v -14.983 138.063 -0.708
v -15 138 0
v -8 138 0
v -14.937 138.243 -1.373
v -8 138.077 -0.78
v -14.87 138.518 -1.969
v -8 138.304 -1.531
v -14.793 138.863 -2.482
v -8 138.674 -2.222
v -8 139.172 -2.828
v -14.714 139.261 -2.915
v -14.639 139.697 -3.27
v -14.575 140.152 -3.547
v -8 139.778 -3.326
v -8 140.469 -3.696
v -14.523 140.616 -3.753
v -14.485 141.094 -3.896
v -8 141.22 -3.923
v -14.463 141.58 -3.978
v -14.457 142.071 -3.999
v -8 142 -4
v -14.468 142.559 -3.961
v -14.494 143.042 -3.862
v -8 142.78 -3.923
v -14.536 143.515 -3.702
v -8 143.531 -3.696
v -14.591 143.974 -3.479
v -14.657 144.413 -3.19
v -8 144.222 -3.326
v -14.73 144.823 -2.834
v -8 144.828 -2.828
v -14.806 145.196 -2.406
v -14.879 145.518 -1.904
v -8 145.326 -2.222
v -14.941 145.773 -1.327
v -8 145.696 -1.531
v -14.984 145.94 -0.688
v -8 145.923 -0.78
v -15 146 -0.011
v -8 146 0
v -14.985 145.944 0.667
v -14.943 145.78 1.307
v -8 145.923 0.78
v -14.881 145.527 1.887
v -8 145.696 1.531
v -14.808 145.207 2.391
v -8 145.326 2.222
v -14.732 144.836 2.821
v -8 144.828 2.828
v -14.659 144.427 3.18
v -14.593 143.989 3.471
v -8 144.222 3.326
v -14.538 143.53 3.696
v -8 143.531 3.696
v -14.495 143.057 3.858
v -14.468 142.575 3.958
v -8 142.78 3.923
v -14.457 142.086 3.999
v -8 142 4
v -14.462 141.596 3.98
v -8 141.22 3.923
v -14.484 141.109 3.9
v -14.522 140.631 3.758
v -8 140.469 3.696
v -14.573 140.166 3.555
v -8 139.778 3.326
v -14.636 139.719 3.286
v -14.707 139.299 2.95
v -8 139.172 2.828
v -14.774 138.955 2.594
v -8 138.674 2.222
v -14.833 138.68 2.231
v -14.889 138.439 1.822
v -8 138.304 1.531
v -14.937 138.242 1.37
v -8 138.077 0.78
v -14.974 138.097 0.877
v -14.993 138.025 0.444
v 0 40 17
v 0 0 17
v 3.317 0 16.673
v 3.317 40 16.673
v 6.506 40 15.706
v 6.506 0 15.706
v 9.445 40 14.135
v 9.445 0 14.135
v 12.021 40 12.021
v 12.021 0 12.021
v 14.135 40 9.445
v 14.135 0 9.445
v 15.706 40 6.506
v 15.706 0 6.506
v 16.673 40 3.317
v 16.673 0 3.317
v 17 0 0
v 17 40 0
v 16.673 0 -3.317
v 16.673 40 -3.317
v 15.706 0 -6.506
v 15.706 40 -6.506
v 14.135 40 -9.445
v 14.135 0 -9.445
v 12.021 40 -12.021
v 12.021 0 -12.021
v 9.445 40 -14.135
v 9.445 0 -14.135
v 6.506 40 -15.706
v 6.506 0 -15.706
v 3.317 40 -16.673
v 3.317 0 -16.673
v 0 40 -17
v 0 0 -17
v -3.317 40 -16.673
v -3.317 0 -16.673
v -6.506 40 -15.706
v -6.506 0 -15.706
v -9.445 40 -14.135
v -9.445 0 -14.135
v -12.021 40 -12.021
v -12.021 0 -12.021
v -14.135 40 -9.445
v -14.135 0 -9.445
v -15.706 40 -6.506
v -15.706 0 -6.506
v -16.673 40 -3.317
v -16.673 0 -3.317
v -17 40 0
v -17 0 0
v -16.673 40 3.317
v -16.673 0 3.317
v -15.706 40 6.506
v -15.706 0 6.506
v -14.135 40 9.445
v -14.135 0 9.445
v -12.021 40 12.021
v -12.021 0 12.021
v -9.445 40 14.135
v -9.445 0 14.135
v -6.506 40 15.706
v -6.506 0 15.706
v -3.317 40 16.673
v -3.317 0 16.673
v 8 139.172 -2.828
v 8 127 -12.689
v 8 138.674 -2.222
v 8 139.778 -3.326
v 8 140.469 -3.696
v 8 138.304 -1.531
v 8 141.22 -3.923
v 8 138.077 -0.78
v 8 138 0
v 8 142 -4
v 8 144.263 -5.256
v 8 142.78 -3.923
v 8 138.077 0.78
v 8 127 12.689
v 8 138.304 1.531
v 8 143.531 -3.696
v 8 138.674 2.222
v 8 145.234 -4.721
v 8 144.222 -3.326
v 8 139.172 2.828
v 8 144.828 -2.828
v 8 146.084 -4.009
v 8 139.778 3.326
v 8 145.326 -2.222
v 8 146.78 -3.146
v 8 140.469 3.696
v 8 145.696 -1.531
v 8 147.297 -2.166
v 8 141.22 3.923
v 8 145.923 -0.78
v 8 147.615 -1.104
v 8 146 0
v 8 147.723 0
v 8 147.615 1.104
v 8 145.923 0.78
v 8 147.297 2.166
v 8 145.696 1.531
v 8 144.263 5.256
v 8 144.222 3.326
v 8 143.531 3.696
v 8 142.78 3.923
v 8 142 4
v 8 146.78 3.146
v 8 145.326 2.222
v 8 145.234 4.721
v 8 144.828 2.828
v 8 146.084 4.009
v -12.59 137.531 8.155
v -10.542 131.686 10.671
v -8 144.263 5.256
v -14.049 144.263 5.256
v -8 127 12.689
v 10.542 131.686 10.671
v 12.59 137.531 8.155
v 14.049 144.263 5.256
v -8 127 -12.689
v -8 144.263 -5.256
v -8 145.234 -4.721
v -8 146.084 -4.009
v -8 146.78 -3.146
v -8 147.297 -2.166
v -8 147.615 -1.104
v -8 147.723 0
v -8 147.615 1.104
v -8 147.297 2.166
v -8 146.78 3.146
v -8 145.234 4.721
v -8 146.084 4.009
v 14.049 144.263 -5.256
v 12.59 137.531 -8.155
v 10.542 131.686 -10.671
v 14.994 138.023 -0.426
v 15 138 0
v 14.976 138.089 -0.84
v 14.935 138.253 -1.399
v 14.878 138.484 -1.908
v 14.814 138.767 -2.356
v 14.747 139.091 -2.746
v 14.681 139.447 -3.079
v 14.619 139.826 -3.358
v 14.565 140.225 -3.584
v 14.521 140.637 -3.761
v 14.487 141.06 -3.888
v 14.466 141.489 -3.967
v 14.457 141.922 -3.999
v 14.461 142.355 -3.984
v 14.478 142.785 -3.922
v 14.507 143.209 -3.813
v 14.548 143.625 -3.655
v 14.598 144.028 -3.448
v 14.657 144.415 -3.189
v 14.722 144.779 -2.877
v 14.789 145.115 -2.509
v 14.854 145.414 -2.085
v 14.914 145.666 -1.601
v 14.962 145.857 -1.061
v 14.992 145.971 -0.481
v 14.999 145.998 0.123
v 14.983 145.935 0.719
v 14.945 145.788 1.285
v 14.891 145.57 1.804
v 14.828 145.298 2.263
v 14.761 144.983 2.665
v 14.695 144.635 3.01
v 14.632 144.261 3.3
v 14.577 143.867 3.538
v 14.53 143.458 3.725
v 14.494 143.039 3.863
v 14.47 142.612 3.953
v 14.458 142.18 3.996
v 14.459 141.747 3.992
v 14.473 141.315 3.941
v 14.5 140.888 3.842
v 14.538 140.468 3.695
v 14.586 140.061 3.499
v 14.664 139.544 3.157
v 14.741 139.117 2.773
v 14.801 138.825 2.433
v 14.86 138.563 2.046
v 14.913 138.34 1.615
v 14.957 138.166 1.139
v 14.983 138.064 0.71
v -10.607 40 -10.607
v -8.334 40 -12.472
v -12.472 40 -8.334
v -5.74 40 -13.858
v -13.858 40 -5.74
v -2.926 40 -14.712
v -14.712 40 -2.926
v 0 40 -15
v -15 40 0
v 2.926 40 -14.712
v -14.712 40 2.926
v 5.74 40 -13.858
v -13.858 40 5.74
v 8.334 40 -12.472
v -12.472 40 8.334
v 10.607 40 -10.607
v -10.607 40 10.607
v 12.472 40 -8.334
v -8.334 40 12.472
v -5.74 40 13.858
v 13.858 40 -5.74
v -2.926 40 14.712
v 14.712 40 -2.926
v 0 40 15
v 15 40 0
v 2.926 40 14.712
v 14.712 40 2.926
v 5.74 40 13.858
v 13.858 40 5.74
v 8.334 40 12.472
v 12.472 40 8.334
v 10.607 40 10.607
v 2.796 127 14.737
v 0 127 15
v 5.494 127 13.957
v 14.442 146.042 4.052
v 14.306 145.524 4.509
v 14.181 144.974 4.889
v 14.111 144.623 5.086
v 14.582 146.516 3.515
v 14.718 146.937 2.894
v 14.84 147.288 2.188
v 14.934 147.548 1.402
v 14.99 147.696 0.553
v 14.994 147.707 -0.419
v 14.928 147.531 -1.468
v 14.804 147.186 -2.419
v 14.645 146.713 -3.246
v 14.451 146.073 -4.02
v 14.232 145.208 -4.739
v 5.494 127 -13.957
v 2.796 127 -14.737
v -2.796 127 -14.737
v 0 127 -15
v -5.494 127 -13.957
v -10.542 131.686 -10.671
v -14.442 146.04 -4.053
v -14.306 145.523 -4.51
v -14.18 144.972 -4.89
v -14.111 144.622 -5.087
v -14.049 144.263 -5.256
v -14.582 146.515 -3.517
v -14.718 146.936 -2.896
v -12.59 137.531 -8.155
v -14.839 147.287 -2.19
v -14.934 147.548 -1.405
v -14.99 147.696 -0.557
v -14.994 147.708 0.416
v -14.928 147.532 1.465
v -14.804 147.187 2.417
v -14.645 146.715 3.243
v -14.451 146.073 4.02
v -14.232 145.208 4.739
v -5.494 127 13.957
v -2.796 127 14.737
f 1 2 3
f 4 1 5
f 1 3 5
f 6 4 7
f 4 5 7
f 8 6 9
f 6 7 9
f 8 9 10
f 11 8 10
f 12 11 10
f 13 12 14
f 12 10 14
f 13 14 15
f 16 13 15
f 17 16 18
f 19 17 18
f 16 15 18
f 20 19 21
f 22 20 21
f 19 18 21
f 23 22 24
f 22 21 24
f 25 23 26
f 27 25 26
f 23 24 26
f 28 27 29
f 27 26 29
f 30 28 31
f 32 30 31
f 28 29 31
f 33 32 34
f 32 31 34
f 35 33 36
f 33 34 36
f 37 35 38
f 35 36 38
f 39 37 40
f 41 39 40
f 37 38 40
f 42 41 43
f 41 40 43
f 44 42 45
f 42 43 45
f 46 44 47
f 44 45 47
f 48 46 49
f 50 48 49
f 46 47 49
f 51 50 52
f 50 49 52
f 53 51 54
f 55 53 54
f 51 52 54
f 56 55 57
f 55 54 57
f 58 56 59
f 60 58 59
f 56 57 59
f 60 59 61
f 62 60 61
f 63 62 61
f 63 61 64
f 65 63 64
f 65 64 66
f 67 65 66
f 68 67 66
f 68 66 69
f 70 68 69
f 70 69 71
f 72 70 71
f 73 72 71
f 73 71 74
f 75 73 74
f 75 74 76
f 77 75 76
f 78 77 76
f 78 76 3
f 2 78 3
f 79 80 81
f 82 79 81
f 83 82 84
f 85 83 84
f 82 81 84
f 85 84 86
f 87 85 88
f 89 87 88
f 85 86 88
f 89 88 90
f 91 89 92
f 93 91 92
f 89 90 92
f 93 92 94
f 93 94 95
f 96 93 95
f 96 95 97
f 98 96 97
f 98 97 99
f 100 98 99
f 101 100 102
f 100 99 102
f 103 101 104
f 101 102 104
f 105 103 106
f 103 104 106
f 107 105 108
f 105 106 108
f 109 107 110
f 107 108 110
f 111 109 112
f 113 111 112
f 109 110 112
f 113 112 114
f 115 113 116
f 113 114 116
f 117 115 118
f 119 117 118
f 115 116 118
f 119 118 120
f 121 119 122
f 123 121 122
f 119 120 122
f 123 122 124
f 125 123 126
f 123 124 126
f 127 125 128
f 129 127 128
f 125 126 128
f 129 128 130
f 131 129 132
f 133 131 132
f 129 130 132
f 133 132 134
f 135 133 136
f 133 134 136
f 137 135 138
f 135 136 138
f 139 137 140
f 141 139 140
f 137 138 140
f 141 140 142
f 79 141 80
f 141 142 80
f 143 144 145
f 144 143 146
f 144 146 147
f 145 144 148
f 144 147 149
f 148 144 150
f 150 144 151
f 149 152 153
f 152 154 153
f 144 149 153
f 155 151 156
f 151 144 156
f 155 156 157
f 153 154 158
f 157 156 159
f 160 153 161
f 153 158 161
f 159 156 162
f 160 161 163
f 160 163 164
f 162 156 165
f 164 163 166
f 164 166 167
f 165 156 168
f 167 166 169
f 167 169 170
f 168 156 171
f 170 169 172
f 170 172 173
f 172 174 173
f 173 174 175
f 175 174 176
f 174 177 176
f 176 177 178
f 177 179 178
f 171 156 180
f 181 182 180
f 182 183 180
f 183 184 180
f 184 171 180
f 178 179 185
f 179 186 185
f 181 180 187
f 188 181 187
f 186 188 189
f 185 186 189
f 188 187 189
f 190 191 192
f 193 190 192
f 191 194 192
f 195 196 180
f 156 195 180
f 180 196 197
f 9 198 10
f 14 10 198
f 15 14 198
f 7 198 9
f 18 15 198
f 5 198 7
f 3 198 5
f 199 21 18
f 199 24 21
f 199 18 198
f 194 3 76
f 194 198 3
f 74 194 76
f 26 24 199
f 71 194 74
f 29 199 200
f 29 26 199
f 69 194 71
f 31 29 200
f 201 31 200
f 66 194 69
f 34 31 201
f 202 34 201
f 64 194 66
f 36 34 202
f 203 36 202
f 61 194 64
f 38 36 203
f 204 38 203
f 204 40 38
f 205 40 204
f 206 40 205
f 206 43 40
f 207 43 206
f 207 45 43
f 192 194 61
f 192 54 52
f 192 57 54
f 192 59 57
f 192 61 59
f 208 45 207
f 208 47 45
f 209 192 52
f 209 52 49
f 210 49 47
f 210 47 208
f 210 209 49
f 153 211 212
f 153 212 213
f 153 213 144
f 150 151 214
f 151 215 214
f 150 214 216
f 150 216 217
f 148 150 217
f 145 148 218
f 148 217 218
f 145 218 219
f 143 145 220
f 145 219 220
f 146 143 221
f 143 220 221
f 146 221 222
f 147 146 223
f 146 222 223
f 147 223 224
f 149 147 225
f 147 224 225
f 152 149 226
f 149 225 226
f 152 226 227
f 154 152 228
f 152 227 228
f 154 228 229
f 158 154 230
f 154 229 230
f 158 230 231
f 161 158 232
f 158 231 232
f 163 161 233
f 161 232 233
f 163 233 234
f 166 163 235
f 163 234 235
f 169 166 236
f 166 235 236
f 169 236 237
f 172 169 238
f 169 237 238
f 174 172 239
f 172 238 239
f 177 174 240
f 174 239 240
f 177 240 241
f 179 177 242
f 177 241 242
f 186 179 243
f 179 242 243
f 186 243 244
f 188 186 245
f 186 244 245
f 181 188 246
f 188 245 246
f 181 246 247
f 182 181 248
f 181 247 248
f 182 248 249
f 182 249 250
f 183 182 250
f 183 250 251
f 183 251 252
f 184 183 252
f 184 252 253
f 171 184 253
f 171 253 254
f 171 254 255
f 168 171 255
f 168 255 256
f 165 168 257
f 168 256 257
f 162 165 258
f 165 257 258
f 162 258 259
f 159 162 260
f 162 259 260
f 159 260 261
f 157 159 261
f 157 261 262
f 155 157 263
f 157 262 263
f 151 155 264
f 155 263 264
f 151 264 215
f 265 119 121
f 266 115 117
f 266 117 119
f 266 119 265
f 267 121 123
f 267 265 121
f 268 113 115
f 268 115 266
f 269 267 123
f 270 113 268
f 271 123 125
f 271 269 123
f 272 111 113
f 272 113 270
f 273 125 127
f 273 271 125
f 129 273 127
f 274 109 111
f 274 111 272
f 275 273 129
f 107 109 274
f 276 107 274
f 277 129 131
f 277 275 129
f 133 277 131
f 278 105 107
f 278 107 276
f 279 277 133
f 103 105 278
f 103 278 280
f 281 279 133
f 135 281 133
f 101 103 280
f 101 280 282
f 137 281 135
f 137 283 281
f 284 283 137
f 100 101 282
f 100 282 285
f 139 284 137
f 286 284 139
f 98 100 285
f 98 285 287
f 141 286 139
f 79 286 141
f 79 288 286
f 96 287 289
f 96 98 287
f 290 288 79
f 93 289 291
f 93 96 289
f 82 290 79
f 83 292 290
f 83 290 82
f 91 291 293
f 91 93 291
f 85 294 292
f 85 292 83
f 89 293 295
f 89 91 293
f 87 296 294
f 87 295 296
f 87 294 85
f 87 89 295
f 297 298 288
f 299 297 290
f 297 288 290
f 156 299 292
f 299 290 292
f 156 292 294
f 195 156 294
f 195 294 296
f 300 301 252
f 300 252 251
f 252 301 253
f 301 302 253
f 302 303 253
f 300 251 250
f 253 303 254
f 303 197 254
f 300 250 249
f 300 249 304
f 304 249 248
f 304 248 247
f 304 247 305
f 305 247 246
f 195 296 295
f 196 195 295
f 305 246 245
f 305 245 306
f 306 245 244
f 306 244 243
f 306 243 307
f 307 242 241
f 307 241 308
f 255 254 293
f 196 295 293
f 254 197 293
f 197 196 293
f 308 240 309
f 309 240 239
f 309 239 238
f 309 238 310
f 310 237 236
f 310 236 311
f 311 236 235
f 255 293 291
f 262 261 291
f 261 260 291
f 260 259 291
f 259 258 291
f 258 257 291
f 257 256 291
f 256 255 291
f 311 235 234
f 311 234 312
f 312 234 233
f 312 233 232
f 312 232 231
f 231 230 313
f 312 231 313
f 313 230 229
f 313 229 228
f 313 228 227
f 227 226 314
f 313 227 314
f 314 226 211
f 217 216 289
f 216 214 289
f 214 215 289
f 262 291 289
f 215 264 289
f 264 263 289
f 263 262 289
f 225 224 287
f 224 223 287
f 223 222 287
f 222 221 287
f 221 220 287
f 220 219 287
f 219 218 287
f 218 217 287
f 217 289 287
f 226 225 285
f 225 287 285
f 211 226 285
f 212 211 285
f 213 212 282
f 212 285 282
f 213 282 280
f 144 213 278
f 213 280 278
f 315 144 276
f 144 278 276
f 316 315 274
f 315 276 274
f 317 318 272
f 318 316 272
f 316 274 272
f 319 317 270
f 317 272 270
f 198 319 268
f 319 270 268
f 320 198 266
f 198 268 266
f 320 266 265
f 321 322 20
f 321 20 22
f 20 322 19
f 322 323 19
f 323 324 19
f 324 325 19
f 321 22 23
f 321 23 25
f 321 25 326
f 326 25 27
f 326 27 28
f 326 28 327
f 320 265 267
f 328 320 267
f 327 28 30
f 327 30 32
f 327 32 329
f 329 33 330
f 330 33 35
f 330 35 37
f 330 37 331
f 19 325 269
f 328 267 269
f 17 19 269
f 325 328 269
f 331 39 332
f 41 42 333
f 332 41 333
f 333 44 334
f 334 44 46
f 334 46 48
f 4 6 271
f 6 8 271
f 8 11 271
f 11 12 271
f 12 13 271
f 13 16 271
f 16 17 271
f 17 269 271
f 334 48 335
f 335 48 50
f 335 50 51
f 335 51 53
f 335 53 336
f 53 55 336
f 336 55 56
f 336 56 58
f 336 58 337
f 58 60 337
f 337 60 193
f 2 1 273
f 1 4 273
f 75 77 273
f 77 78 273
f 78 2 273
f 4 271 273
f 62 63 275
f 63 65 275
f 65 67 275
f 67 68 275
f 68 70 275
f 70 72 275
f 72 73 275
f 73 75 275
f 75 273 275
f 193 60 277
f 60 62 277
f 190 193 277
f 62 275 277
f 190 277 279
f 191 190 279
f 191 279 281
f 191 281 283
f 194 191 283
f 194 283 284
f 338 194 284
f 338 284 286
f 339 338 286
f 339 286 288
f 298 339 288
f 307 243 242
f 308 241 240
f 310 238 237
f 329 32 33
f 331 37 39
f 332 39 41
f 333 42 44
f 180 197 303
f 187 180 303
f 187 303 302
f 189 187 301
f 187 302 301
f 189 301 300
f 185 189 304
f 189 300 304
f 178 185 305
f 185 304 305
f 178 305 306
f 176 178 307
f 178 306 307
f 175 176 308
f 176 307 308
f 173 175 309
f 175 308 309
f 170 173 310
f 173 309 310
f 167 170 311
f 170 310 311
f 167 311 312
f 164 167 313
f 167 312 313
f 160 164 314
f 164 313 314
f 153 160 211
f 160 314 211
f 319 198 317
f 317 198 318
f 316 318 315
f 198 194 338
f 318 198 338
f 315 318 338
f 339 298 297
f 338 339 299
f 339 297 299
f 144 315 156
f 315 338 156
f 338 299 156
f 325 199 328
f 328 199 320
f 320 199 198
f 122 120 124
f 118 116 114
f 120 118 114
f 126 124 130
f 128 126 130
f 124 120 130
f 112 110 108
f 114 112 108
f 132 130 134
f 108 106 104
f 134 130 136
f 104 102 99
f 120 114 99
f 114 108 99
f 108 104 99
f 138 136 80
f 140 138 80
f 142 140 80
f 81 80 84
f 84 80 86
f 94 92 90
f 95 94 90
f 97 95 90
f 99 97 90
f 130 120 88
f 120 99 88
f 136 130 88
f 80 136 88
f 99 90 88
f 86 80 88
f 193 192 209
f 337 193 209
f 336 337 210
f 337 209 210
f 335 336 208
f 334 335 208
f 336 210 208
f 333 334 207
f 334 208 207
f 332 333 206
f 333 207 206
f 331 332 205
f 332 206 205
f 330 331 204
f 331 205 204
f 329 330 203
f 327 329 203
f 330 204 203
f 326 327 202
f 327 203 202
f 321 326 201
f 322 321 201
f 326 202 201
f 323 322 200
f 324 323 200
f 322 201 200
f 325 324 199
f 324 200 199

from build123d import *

# Parameters (mm, degrees)
SKETCH_1_R          = 17
EXTRUDE_1_DEPTH     = 40
SKETCH_2_R          = 15
EXTRUDE_2_DEPTH     = 110
SKETCH_3_W          = 16
SKETCH_3_H          = 46
CUT_EXTRUDE_1_DEPTH = 15
SKETCH_4_R          = 4
CUT_EXTRUDE_2_DEPTH = 15
CUT_EXTRUDE_4_DEPTH = 15


with BuildPart() as part:
    # 草图1 → 凸台-拉伸1 (new body)
    with BuildSketch(Plane(origin=(0, 0, 0), x_dir=(1, 0, 0), z_dir=(0, 1, 0))):
        with Locations(Location((0, 0, 0), (0, 0, 270))):
            Circle(SKETCH_1_R)
    extrude(amount=EXTRUDE_1_DEPTH)

    # 草图2 → 凸台-拉伸2 (add)
    with BuildSketch(Plane(origin=(0, 40, 0), x_dir=(1, 0, 0), z_dir=(0, 1, 0))):
        with Locations(Location((0, 0, 0), (0, 0, 270))):
            Circle(SKETCH_2_R)
    extrude(amount=EXTRUDE_2_DEPTH)

    # 草图3 → 切除-拉伸1 (cut, symmetric)
    with BuildSketch(Plane.XY):
        with Locations((0, 150)):
            Rectangle(SKETCH_3_W, SKETCH_3_H)
    extrude(amount=CUT_EXTRUDE_1_DEPTH, both=True, mode=Mode.SUBTRACT)

    # 草图4 → 切除-拉伸2 (cut, symmetric)
    with BuildSketch(Plane(origin=(0, 0, 0), x_dir=(0, 0, -1), z_dir=(1, 0, 0))):
        with Locations(Location((0, 142, 0), (0, 0, 270))):
            Circle(SKETCH_4_R)
    extrude(amount=CUT_EXTRUDE_2_DEPTH, both=True, mode=Mode.SUBTRACT)

    # 草图8 → 切除-拉伸4 (cut, symmetric)
    with BuildSketch(Plane(origin=(0, 0, 0), x_dir=(0, 0, -1), z_dir=(1, 0, 0))):
        with BuildLine():
            Line((-12.68857754, 127), (-5.256345918, 144.263010824))
            ThreePointArc((-5.256345918, 144.263010824), (0, 147.722795681), (5.256345918, 144.263010824))
            Line((5.256345918, 144.263010824), (12.68857754, 127))
            Line((12.68857754, 127), (12.68857754, 150))
            Line((12.68857754, 150), (-12.68857754, 150))
            Line((-12.68857754, 150), (-12.68857754, 127))
        make_face()
    extrude(amount=CUT_EXTRUDE_4_DEPTH, both=True, mode=Mode.SUBTRACT)


solid = part.part
